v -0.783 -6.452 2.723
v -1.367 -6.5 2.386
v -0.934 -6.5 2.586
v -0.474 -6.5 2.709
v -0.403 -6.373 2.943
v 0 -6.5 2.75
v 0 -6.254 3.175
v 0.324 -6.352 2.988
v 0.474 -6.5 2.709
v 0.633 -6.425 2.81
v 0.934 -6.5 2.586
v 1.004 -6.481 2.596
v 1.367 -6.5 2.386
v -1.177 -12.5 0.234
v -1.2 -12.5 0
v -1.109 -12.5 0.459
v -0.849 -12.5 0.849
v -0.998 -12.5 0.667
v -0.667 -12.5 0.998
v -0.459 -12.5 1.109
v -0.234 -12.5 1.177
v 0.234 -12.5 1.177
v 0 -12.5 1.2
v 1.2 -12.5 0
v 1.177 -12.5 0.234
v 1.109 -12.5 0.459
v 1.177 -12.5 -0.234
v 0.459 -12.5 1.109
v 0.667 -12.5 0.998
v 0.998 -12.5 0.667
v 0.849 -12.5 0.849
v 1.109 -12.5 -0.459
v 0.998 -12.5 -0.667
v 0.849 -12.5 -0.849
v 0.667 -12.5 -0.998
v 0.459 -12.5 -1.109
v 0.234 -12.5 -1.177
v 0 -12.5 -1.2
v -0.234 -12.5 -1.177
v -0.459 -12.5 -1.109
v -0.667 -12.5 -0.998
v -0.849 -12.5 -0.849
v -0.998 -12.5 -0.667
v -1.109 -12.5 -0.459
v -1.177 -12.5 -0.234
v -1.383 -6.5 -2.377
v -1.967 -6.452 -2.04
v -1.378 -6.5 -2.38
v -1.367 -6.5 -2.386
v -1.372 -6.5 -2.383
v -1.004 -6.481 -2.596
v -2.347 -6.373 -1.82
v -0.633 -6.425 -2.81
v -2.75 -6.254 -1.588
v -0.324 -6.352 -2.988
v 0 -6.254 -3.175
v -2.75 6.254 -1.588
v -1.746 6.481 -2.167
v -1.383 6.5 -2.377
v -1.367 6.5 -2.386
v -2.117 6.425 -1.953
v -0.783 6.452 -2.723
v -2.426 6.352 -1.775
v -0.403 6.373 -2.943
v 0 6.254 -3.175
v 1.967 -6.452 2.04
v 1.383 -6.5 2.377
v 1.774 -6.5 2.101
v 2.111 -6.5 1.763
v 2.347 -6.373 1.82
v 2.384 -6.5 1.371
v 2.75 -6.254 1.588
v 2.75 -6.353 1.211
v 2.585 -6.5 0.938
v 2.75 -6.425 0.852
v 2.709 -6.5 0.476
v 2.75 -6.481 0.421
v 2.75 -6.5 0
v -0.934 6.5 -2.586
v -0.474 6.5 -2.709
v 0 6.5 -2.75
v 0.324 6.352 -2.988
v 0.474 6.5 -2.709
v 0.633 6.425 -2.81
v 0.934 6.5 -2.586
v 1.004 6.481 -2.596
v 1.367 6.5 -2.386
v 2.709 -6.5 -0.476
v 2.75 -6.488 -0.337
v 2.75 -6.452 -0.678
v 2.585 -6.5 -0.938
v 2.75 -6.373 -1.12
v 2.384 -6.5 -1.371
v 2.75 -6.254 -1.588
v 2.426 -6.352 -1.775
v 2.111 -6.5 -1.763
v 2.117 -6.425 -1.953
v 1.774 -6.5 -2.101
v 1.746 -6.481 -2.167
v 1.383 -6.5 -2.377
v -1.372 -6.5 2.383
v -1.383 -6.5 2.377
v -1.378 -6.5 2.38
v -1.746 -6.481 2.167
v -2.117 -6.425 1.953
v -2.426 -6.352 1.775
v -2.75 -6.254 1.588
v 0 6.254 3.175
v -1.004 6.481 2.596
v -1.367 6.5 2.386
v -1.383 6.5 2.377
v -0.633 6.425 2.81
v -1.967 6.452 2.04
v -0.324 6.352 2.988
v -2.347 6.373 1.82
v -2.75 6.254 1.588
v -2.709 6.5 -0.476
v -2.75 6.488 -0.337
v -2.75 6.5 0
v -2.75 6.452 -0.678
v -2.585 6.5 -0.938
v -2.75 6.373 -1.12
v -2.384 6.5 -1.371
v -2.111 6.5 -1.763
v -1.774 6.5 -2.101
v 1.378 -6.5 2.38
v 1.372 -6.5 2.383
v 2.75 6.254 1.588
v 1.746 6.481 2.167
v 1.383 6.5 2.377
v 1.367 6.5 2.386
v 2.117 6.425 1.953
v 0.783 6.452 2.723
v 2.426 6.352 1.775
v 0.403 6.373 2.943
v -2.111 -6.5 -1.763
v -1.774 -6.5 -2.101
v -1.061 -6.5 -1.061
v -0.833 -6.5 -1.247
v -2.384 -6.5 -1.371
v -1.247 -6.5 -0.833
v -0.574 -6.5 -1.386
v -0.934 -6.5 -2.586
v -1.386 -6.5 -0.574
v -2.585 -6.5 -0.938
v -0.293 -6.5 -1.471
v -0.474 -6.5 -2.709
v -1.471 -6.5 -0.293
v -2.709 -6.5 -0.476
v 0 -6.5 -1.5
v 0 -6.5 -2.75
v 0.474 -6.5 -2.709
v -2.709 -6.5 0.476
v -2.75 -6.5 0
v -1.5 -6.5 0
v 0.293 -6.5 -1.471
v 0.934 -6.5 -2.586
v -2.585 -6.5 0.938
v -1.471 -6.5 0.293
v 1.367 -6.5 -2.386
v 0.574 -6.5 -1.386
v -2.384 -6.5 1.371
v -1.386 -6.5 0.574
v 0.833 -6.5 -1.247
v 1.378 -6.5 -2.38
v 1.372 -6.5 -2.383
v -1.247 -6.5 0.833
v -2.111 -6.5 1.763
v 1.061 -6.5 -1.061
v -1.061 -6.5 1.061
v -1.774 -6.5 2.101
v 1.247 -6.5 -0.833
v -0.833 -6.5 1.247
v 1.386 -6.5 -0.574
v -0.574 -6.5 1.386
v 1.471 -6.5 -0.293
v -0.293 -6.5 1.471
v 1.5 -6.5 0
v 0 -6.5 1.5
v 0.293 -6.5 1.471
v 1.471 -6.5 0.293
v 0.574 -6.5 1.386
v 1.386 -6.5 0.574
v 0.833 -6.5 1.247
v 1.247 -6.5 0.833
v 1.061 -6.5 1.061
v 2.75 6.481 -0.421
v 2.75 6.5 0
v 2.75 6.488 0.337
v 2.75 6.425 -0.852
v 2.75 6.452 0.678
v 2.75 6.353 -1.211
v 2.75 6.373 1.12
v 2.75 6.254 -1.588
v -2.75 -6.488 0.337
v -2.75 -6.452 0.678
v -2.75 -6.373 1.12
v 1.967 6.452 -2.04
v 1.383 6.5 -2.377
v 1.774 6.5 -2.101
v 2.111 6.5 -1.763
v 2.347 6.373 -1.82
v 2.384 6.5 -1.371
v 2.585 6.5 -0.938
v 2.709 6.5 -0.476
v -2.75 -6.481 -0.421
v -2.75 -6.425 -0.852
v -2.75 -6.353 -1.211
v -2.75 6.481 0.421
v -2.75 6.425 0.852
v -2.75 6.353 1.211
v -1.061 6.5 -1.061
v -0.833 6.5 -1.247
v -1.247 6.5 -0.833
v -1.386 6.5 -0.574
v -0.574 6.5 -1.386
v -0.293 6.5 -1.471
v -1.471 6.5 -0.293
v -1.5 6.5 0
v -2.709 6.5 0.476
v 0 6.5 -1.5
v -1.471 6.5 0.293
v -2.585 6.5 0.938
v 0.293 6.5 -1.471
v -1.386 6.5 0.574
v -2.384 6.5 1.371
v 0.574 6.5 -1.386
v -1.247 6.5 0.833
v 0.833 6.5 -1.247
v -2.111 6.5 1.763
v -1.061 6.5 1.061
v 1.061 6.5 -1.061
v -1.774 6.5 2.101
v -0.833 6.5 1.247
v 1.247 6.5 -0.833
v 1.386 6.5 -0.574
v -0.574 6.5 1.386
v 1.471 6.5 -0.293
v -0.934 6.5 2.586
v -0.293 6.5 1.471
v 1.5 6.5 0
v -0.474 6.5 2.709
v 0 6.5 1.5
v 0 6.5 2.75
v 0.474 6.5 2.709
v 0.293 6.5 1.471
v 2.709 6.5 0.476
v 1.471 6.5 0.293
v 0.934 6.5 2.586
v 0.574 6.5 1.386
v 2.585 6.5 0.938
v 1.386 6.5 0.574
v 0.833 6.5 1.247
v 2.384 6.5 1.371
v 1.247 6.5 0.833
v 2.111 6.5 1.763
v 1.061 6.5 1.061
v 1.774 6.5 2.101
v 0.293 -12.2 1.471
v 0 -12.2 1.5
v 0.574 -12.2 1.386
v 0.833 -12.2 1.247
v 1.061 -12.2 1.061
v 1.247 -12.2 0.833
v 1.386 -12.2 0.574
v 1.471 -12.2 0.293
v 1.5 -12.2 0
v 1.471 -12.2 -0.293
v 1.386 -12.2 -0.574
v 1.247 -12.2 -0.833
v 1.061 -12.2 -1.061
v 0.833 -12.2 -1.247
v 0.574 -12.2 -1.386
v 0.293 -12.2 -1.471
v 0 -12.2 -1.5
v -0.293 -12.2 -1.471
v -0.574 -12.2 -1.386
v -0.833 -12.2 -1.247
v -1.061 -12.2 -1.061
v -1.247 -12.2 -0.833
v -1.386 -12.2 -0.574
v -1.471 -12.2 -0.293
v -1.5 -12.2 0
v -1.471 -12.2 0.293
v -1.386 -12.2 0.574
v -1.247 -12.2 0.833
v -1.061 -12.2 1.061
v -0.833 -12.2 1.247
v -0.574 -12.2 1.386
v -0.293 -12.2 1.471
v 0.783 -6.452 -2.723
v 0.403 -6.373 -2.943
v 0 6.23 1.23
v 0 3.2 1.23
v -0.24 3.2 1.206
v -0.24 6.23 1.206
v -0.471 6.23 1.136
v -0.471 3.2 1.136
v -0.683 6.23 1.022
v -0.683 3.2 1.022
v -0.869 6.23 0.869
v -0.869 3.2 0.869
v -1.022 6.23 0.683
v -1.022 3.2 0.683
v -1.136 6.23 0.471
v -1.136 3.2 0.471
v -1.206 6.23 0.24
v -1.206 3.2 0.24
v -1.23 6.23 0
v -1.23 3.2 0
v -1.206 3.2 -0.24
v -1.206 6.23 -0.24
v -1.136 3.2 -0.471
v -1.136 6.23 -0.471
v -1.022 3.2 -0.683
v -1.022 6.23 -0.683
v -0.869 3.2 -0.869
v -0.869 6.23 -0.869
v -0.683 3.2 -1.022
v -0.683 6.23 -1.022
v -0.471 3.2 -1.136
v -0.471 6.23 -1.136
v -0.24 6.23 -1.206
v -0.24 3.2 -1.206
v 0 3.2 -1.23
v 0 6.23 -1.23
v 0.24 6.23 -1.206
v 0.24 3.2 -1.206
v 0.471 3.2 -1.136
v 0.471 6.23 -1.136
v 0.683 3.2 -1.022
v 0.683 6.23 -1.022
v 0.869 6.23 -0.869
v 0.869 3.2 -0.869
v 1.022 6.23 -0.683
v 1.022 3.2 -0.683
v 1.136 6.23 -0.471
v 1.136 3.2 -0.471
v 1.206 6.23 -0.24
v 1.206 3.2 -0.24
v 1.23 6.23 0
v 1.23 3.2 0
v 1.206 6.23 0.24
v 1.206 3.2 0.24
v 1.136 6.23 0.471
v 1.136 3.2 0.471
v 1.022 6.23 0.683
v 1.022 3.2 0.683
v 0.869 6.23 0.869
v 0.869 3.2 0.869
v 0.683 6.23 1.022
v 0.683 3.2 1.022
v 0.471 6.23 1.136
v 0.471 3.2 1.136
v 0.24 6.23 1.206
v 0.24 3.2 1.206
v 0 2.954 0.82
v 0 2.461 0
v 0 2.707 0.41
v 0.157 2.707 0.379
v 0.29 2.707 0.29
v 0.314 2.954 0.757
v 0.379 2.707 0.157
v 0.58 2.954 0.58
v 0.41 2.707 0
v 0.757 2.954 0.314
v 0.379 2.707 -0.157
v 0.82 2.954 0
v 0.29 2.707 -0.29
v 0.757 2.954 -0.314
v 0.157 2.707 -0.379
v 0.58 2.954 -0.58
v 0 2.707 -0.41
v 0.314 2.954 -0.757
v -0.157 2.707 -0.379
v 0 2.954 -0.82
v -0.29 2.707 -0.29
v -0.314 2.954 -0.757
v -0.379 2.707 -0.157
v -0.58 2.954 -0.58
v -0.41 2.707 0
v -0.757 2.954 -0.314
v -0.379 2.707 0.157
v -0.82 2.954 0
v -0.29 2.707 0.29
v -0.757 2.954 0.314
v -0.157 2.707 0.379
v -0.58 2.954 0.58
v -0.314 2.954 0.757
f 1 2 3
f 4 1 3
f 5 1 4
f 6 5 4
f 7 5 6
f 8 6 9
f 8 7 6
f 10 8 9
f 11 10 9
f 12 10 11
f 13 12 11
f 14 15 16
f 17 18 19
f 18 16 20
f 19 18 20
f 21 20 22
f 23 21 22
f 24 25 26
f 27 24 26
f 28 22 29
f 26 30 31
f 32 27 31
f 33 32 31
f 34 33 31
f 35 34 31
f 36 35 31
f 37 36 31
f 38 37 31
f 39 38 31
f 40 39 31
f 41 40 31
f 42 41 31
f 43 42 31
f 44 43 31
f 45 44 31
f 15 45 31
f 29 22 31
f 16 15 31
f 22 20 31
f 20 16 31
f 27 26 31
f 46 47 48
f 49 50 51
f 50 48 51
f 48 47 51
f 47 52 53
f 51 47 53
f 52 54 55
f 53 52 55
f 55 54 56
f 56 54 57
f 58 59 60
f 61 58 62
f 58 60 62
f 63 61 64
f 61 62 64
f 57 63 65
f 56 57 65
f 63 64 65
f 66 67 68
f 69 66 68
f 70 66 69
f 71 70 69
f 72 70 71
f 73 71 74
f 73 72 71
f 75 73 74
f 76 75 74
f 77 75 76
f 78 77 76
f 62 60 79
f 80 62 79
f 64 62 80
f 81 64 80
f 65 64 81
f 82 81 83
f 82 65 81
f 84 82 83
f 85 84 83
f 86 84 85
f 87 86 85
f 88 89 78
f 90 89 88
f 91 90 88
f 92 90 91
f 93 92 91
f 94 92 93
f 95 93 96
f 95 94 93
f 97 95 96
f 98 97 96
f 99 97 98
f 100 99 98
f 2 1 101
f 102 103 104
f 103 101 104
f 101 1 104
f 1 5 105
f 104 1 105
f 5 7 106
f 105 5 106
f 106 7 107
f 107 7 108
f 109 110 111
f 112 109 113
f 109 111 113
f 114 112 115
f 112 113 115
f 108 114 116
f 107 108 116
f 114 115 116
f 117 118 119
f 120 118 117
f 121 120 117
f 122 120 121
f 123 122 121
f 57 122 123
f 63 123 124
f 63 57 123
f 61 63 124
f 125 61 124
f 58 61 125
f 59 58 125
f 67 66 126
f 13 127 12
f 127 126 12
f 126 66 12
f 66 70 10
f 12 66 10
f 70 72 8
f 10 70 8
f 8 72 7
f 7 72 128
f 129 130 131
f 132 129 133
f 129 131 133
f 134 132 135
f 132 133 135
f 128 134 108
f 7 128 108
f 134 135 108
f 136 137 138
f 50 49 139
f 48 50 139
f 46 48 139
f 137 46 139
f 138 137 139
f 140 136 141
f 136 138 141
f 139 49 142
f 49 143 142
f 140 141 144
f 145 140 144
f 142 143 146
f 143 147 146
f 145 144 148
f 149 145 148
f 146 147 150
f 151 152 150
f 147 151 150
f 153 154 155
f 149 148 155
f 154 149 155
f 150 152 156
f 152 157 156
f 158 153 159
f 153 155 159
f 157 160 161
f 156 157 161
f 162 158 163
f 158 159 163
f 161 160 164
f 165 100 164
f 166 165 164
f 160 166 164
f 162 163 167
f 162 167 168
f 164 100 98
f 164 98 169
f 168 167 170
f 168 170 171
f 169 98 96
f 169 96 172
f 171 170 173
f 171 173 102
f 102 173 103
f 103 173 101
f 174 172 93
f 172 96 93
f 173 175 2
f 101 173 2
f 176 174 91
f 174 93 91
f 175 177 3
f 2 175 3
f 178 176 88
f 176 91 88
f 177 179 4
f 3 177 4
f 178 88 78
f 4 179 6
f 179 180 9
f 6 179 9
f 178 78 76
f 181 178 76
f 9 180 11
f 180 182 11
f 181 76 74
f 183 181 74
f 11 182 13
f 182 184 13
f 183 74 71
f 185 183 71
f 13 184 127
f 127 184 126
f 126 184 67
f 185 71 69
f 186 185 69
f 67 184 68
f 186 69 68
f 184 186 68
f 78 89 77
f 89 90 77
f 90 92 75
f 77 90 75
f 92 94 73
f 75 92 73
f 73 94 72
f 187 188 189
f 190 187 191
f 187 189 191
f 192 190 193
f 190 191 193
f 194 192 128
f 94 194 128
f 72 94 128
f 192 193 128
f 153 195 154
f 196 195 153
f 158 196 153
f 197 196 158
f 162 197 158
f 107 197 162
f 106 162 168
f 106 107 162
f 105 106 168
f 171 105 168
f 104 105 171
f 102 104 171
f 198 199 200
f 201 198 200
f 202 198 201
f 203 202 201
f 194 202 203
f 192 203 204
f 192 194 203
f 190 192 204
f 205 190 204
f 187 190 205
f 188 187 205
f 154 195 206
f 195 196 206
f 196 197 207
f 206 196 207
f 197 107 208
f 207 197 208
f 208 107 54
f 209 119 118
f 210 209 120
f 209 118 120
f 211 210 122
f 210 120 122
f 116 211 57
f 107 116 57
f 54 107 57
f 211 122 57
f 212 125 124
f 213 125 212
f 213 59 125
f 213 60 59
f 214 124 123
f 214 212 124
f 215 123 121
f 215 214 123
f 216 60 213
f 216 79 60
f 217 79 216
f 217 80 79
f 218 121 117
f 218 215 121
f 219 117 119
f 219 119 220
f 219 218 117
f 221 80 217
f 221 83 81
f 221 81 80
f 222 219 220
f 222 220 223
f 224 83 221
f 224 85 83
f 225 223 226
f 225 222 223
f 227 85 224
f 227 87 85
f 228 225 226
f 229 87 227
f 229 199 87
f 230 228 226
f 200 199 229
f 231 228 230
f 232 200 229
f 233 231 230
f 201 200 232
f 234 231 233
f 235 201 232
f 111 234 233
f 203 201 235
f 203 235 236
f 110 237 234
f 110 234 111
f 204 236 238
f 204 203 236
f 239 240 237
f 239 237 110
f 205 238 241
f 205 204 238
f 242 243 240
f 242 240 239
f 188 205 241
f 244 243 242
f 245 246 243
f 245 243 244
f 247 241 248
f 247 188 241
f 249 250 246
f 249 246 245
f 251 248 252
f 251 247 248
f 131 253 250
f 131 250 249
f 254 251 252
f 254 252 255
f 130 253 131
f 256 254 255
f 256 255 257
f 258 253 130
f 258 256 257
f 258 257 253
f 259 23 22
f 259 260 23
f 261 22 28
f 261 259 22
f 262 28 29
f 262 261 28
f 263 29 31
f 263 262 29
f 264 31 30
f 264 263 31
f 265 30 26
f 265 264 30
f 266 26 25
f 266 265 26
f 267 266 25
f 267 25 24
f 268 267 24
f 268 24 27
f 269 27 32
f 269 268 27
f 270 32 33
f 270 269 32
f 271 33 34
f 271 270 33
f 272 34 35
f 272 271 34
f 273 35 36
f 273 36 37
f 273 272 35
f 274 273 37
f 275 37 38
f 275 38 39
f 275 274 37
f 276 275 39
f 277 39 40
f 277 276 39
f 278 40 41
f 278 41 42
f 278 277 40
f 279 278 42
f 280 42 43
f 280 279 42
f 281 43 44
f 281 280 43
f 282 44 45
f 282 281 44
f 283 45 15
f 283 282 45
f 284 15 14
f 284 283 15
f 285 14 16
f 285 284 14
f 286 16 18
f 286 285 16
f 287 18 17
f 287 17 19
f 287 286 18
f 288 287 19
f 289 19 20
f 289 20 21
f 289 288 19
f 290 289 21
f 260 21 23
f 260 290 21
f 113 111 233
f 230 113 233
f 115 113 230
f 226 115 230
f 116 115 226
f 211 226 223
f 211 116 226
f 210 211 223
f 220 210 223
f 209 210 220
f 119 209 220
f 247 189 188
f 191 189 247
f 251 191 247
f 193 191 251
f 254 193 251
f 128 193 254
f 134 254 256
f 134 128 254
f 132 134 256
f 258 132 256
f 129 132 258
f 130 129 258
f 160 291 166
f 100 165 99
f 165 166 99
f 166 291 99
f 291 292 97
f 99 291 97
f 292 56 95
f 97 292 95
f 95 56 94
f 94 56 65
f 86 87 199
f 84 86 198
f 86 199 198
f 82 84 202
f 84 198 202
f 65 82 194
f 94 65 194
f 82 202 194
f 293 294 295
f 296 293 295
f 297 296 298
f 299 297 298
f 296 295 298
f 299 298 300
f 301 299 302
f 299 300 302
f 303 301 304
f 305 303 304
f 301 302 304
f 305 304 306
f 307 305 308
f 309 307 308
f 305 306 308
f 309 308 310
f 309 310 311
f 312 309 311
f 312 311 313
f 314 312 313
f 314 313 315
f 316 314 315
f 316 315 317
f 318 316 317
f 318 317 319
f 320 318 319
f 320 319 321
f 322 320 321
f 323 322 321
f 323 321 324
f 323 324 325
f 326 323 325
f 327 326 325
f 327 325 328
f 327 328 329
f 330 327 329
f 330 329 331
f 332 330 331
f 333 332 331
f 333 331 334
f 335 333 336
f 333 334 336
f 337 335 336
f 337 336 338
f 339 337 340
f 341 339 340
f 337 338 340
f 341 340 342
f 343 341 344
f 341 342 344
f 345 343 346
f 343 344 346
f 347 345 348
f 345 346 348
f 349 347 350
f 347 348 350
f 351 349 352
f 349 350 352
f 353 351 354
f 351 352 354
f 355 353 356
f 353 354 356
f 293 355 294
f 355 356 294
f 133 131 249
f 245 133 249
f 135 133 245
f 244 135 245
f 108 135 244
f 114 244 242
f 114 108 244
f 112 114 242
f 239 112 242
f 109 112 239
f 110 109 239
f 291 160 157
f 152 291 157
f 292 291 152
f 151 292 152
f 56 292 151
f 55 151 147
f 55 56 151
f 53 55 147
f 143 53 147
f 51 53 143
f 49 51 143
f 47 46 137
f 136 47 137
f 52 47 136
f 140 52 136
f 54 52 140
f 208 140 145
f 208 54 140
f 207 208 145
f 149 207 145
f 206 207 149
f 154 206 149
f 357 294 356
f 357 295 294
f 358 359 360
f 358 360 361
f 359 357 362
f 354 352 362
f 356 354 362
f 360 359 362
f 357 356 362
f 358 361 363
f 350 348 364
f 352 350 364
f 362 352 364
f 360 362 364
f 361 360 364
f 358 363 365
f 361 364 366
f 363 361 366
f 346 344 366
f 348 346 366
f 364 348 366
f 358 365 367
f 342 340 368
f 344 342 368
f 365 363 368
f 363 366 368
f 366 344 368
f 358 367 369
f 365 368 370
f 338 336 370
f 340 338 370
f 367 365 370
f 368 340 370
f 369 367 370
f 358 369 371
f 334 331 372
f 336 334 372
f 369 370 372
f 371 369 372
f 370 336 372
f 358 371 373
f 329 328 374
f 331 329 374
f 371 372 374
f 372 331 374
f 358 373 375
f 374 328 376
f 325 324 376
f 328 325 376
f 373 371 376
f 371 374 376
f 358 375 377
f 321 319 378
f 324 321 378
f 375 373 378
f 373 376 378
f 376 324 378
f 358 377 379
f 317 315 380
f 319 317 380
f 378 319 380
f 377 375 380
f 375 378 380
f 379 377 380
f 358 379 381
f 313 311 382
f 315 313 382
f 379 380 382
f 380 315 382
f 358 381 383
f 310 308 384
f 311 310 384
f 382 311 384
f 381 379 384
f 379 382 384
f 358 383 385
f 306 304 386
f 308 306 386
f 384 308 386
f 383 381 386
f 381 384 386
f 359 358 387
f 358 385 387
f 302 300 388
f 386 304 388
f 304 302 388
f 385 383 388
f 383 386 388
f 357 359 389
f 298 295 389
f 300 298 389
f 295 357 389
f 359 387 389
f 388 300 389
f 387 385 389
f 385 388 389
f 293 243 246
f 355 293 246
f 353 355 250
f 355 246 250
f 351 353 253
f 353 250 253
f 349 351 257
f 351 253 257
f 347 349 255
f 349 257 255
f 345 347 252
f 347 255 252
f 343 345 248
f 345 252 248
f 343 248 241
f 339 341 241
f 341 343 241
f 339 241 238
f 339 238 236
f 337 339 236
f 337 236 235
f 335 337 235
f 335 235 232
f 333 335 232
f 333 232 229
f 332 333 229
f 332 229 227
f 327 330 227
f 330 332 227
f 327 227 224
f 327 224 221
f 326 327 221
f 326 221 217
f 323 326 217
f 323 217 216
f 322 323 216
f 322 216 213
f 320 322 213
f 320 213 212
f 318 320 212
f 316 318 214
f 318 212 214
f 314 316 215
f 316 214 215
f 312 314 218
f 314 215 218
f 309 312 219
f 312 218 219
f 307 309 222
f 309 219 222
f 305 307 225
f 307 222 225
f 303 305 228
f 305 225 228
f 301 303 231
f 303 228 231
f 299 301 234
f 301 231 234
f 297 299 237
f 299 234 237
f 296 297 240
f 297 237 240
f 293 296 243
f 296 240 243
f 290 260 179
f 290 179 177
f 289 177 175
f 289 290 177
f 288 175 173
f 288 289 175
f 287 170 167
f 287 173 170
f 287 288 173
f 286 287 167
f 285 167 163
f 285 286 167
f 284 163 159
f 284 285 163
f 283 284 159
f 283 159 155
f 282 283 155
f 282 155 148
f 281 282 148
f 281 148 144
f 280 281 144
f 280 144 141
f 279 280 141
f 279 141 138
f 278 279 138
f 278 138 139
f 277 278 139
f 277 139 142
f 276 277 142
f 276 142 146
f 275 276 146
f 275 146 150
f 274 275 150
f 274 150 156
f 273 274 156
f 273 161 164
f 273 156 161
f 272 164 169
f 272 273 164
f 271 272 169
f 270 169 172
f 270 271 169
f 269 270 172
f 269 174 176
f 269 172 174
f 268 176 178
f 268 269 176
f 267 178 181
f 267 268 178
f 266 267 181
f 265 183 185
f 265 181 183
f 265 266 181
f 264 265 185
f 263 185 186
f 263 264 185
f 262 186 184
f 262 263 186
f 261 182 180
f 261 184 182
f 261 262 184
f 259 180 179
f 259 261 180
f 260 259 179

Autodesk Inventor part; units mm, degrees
ref_plane "YZ Plane" through (0, 0, 0) normal (1, 0, 0) x (0, 1, 0)
ref_plane "XZ Plane" through (0, 0, 0) normal (0, 1, 0) x (-1, 0, 0)
ref_plane "XY Plane" through (0, 0, 0) normal (0, 0, 1) x (1, 0, 0)
sketch "スケッチ1" plane through (0, 0, 0) normal (1, 0, 0) x (0, 1, 0)
  line L0 (-6.5, 0) -> (6.5, 0)
  line L1 (0, 0) -> (0, 3.1754) construction
  line L2 (-6.2544, 3.1754) -> (-6.5, 2.75)
  line L3 (-6.5, 2.75) -> (-6.5, 0)
  line L4 (-6.2544, 3.1754) -> (6.2544, 3.1754)
  line L5 (6.2544, 3.1754) -> (6.5, 2.75)
  line L6 (6.5, 2.75) -> (6.5, 0)
  line L7 (-6.5, 1.5) -> (-12.2, 1.5)
  line L8 (-12.5, 1.2) -> (-12.5, 0)
  line L9 (-12.5, 0) -> (-6.5, 0)
  line L10 (-12.2, 1.5) -> (-12.5, 1.2)
  point P0 (6.5, 1.5)
  point P1 (-12.5, 1.5)
  dimension "d1" = 2.75
  dimension "d2" = 3.1754
  dimension "d3" = 30
  dimension "d4" = 13
  dimension "d18" = 6
  dimension "d19" = 3
  dimension "d22" = 0.3
  dimension "d23" = 0.3
revolve "回転1" add sketch "スケッチ1" angle 360 about axis through (0, -6.5, 0) along (0, 1, 0)
sketch "スケッチ2" plane through (0, 6.5, 0) normal (0, 1, 0) x (1, 0, 0)
  line L0 (0, -3.1754) -> (-2.75, -1.5877)
  line L1 (-2.75, -1.5877) -> (-2.75, 1.5877)
  line L2 (-2.75, 1.5877) -> (0, 3.1754)
  line L3 (0, 3.1754) -> (2.75, 1.5877)
  line L4 (2.75, 1.5877) -> (2.75, -1.5877)
  line L5 (2.75, -1.5877) -> (0, -3.1754)
  circle A0 centre (0, 0) radius 3.1754 projected
  point P0 (0, 0)
  point P1 (0, 0)
  point P2 (0, 3.1754)
  point P3 (0, 3.1754)
  point P4 (2.75, -1.5877)
  point P5 (2.75, -1.5877)
extrude "押し出し1" cut sketch "スケッチ2" against normal through all contours A0 L0 | L5 A0 | A0 L1 | L4 A0 | A0 L2 | L3 A0
hole "穴1" at (0, 6.5, 0) direction (0, -1, 0) diameter 2.459 depth 3.3 tip angle 118 countersink diameter 3 countersink angle 90 thread size "M3x0.5" class "6H" standard "ISO Metric profile"
thread "ねじ1" size "M3x0.5" class "6g" standard "ANSI Metric M Profile" full length
equation "\"d2\" = 1.1547 * d1"
equation "\"d23\" = d22"
properties part number "BSL-313BE" material "アセタール樹脂、黒"
